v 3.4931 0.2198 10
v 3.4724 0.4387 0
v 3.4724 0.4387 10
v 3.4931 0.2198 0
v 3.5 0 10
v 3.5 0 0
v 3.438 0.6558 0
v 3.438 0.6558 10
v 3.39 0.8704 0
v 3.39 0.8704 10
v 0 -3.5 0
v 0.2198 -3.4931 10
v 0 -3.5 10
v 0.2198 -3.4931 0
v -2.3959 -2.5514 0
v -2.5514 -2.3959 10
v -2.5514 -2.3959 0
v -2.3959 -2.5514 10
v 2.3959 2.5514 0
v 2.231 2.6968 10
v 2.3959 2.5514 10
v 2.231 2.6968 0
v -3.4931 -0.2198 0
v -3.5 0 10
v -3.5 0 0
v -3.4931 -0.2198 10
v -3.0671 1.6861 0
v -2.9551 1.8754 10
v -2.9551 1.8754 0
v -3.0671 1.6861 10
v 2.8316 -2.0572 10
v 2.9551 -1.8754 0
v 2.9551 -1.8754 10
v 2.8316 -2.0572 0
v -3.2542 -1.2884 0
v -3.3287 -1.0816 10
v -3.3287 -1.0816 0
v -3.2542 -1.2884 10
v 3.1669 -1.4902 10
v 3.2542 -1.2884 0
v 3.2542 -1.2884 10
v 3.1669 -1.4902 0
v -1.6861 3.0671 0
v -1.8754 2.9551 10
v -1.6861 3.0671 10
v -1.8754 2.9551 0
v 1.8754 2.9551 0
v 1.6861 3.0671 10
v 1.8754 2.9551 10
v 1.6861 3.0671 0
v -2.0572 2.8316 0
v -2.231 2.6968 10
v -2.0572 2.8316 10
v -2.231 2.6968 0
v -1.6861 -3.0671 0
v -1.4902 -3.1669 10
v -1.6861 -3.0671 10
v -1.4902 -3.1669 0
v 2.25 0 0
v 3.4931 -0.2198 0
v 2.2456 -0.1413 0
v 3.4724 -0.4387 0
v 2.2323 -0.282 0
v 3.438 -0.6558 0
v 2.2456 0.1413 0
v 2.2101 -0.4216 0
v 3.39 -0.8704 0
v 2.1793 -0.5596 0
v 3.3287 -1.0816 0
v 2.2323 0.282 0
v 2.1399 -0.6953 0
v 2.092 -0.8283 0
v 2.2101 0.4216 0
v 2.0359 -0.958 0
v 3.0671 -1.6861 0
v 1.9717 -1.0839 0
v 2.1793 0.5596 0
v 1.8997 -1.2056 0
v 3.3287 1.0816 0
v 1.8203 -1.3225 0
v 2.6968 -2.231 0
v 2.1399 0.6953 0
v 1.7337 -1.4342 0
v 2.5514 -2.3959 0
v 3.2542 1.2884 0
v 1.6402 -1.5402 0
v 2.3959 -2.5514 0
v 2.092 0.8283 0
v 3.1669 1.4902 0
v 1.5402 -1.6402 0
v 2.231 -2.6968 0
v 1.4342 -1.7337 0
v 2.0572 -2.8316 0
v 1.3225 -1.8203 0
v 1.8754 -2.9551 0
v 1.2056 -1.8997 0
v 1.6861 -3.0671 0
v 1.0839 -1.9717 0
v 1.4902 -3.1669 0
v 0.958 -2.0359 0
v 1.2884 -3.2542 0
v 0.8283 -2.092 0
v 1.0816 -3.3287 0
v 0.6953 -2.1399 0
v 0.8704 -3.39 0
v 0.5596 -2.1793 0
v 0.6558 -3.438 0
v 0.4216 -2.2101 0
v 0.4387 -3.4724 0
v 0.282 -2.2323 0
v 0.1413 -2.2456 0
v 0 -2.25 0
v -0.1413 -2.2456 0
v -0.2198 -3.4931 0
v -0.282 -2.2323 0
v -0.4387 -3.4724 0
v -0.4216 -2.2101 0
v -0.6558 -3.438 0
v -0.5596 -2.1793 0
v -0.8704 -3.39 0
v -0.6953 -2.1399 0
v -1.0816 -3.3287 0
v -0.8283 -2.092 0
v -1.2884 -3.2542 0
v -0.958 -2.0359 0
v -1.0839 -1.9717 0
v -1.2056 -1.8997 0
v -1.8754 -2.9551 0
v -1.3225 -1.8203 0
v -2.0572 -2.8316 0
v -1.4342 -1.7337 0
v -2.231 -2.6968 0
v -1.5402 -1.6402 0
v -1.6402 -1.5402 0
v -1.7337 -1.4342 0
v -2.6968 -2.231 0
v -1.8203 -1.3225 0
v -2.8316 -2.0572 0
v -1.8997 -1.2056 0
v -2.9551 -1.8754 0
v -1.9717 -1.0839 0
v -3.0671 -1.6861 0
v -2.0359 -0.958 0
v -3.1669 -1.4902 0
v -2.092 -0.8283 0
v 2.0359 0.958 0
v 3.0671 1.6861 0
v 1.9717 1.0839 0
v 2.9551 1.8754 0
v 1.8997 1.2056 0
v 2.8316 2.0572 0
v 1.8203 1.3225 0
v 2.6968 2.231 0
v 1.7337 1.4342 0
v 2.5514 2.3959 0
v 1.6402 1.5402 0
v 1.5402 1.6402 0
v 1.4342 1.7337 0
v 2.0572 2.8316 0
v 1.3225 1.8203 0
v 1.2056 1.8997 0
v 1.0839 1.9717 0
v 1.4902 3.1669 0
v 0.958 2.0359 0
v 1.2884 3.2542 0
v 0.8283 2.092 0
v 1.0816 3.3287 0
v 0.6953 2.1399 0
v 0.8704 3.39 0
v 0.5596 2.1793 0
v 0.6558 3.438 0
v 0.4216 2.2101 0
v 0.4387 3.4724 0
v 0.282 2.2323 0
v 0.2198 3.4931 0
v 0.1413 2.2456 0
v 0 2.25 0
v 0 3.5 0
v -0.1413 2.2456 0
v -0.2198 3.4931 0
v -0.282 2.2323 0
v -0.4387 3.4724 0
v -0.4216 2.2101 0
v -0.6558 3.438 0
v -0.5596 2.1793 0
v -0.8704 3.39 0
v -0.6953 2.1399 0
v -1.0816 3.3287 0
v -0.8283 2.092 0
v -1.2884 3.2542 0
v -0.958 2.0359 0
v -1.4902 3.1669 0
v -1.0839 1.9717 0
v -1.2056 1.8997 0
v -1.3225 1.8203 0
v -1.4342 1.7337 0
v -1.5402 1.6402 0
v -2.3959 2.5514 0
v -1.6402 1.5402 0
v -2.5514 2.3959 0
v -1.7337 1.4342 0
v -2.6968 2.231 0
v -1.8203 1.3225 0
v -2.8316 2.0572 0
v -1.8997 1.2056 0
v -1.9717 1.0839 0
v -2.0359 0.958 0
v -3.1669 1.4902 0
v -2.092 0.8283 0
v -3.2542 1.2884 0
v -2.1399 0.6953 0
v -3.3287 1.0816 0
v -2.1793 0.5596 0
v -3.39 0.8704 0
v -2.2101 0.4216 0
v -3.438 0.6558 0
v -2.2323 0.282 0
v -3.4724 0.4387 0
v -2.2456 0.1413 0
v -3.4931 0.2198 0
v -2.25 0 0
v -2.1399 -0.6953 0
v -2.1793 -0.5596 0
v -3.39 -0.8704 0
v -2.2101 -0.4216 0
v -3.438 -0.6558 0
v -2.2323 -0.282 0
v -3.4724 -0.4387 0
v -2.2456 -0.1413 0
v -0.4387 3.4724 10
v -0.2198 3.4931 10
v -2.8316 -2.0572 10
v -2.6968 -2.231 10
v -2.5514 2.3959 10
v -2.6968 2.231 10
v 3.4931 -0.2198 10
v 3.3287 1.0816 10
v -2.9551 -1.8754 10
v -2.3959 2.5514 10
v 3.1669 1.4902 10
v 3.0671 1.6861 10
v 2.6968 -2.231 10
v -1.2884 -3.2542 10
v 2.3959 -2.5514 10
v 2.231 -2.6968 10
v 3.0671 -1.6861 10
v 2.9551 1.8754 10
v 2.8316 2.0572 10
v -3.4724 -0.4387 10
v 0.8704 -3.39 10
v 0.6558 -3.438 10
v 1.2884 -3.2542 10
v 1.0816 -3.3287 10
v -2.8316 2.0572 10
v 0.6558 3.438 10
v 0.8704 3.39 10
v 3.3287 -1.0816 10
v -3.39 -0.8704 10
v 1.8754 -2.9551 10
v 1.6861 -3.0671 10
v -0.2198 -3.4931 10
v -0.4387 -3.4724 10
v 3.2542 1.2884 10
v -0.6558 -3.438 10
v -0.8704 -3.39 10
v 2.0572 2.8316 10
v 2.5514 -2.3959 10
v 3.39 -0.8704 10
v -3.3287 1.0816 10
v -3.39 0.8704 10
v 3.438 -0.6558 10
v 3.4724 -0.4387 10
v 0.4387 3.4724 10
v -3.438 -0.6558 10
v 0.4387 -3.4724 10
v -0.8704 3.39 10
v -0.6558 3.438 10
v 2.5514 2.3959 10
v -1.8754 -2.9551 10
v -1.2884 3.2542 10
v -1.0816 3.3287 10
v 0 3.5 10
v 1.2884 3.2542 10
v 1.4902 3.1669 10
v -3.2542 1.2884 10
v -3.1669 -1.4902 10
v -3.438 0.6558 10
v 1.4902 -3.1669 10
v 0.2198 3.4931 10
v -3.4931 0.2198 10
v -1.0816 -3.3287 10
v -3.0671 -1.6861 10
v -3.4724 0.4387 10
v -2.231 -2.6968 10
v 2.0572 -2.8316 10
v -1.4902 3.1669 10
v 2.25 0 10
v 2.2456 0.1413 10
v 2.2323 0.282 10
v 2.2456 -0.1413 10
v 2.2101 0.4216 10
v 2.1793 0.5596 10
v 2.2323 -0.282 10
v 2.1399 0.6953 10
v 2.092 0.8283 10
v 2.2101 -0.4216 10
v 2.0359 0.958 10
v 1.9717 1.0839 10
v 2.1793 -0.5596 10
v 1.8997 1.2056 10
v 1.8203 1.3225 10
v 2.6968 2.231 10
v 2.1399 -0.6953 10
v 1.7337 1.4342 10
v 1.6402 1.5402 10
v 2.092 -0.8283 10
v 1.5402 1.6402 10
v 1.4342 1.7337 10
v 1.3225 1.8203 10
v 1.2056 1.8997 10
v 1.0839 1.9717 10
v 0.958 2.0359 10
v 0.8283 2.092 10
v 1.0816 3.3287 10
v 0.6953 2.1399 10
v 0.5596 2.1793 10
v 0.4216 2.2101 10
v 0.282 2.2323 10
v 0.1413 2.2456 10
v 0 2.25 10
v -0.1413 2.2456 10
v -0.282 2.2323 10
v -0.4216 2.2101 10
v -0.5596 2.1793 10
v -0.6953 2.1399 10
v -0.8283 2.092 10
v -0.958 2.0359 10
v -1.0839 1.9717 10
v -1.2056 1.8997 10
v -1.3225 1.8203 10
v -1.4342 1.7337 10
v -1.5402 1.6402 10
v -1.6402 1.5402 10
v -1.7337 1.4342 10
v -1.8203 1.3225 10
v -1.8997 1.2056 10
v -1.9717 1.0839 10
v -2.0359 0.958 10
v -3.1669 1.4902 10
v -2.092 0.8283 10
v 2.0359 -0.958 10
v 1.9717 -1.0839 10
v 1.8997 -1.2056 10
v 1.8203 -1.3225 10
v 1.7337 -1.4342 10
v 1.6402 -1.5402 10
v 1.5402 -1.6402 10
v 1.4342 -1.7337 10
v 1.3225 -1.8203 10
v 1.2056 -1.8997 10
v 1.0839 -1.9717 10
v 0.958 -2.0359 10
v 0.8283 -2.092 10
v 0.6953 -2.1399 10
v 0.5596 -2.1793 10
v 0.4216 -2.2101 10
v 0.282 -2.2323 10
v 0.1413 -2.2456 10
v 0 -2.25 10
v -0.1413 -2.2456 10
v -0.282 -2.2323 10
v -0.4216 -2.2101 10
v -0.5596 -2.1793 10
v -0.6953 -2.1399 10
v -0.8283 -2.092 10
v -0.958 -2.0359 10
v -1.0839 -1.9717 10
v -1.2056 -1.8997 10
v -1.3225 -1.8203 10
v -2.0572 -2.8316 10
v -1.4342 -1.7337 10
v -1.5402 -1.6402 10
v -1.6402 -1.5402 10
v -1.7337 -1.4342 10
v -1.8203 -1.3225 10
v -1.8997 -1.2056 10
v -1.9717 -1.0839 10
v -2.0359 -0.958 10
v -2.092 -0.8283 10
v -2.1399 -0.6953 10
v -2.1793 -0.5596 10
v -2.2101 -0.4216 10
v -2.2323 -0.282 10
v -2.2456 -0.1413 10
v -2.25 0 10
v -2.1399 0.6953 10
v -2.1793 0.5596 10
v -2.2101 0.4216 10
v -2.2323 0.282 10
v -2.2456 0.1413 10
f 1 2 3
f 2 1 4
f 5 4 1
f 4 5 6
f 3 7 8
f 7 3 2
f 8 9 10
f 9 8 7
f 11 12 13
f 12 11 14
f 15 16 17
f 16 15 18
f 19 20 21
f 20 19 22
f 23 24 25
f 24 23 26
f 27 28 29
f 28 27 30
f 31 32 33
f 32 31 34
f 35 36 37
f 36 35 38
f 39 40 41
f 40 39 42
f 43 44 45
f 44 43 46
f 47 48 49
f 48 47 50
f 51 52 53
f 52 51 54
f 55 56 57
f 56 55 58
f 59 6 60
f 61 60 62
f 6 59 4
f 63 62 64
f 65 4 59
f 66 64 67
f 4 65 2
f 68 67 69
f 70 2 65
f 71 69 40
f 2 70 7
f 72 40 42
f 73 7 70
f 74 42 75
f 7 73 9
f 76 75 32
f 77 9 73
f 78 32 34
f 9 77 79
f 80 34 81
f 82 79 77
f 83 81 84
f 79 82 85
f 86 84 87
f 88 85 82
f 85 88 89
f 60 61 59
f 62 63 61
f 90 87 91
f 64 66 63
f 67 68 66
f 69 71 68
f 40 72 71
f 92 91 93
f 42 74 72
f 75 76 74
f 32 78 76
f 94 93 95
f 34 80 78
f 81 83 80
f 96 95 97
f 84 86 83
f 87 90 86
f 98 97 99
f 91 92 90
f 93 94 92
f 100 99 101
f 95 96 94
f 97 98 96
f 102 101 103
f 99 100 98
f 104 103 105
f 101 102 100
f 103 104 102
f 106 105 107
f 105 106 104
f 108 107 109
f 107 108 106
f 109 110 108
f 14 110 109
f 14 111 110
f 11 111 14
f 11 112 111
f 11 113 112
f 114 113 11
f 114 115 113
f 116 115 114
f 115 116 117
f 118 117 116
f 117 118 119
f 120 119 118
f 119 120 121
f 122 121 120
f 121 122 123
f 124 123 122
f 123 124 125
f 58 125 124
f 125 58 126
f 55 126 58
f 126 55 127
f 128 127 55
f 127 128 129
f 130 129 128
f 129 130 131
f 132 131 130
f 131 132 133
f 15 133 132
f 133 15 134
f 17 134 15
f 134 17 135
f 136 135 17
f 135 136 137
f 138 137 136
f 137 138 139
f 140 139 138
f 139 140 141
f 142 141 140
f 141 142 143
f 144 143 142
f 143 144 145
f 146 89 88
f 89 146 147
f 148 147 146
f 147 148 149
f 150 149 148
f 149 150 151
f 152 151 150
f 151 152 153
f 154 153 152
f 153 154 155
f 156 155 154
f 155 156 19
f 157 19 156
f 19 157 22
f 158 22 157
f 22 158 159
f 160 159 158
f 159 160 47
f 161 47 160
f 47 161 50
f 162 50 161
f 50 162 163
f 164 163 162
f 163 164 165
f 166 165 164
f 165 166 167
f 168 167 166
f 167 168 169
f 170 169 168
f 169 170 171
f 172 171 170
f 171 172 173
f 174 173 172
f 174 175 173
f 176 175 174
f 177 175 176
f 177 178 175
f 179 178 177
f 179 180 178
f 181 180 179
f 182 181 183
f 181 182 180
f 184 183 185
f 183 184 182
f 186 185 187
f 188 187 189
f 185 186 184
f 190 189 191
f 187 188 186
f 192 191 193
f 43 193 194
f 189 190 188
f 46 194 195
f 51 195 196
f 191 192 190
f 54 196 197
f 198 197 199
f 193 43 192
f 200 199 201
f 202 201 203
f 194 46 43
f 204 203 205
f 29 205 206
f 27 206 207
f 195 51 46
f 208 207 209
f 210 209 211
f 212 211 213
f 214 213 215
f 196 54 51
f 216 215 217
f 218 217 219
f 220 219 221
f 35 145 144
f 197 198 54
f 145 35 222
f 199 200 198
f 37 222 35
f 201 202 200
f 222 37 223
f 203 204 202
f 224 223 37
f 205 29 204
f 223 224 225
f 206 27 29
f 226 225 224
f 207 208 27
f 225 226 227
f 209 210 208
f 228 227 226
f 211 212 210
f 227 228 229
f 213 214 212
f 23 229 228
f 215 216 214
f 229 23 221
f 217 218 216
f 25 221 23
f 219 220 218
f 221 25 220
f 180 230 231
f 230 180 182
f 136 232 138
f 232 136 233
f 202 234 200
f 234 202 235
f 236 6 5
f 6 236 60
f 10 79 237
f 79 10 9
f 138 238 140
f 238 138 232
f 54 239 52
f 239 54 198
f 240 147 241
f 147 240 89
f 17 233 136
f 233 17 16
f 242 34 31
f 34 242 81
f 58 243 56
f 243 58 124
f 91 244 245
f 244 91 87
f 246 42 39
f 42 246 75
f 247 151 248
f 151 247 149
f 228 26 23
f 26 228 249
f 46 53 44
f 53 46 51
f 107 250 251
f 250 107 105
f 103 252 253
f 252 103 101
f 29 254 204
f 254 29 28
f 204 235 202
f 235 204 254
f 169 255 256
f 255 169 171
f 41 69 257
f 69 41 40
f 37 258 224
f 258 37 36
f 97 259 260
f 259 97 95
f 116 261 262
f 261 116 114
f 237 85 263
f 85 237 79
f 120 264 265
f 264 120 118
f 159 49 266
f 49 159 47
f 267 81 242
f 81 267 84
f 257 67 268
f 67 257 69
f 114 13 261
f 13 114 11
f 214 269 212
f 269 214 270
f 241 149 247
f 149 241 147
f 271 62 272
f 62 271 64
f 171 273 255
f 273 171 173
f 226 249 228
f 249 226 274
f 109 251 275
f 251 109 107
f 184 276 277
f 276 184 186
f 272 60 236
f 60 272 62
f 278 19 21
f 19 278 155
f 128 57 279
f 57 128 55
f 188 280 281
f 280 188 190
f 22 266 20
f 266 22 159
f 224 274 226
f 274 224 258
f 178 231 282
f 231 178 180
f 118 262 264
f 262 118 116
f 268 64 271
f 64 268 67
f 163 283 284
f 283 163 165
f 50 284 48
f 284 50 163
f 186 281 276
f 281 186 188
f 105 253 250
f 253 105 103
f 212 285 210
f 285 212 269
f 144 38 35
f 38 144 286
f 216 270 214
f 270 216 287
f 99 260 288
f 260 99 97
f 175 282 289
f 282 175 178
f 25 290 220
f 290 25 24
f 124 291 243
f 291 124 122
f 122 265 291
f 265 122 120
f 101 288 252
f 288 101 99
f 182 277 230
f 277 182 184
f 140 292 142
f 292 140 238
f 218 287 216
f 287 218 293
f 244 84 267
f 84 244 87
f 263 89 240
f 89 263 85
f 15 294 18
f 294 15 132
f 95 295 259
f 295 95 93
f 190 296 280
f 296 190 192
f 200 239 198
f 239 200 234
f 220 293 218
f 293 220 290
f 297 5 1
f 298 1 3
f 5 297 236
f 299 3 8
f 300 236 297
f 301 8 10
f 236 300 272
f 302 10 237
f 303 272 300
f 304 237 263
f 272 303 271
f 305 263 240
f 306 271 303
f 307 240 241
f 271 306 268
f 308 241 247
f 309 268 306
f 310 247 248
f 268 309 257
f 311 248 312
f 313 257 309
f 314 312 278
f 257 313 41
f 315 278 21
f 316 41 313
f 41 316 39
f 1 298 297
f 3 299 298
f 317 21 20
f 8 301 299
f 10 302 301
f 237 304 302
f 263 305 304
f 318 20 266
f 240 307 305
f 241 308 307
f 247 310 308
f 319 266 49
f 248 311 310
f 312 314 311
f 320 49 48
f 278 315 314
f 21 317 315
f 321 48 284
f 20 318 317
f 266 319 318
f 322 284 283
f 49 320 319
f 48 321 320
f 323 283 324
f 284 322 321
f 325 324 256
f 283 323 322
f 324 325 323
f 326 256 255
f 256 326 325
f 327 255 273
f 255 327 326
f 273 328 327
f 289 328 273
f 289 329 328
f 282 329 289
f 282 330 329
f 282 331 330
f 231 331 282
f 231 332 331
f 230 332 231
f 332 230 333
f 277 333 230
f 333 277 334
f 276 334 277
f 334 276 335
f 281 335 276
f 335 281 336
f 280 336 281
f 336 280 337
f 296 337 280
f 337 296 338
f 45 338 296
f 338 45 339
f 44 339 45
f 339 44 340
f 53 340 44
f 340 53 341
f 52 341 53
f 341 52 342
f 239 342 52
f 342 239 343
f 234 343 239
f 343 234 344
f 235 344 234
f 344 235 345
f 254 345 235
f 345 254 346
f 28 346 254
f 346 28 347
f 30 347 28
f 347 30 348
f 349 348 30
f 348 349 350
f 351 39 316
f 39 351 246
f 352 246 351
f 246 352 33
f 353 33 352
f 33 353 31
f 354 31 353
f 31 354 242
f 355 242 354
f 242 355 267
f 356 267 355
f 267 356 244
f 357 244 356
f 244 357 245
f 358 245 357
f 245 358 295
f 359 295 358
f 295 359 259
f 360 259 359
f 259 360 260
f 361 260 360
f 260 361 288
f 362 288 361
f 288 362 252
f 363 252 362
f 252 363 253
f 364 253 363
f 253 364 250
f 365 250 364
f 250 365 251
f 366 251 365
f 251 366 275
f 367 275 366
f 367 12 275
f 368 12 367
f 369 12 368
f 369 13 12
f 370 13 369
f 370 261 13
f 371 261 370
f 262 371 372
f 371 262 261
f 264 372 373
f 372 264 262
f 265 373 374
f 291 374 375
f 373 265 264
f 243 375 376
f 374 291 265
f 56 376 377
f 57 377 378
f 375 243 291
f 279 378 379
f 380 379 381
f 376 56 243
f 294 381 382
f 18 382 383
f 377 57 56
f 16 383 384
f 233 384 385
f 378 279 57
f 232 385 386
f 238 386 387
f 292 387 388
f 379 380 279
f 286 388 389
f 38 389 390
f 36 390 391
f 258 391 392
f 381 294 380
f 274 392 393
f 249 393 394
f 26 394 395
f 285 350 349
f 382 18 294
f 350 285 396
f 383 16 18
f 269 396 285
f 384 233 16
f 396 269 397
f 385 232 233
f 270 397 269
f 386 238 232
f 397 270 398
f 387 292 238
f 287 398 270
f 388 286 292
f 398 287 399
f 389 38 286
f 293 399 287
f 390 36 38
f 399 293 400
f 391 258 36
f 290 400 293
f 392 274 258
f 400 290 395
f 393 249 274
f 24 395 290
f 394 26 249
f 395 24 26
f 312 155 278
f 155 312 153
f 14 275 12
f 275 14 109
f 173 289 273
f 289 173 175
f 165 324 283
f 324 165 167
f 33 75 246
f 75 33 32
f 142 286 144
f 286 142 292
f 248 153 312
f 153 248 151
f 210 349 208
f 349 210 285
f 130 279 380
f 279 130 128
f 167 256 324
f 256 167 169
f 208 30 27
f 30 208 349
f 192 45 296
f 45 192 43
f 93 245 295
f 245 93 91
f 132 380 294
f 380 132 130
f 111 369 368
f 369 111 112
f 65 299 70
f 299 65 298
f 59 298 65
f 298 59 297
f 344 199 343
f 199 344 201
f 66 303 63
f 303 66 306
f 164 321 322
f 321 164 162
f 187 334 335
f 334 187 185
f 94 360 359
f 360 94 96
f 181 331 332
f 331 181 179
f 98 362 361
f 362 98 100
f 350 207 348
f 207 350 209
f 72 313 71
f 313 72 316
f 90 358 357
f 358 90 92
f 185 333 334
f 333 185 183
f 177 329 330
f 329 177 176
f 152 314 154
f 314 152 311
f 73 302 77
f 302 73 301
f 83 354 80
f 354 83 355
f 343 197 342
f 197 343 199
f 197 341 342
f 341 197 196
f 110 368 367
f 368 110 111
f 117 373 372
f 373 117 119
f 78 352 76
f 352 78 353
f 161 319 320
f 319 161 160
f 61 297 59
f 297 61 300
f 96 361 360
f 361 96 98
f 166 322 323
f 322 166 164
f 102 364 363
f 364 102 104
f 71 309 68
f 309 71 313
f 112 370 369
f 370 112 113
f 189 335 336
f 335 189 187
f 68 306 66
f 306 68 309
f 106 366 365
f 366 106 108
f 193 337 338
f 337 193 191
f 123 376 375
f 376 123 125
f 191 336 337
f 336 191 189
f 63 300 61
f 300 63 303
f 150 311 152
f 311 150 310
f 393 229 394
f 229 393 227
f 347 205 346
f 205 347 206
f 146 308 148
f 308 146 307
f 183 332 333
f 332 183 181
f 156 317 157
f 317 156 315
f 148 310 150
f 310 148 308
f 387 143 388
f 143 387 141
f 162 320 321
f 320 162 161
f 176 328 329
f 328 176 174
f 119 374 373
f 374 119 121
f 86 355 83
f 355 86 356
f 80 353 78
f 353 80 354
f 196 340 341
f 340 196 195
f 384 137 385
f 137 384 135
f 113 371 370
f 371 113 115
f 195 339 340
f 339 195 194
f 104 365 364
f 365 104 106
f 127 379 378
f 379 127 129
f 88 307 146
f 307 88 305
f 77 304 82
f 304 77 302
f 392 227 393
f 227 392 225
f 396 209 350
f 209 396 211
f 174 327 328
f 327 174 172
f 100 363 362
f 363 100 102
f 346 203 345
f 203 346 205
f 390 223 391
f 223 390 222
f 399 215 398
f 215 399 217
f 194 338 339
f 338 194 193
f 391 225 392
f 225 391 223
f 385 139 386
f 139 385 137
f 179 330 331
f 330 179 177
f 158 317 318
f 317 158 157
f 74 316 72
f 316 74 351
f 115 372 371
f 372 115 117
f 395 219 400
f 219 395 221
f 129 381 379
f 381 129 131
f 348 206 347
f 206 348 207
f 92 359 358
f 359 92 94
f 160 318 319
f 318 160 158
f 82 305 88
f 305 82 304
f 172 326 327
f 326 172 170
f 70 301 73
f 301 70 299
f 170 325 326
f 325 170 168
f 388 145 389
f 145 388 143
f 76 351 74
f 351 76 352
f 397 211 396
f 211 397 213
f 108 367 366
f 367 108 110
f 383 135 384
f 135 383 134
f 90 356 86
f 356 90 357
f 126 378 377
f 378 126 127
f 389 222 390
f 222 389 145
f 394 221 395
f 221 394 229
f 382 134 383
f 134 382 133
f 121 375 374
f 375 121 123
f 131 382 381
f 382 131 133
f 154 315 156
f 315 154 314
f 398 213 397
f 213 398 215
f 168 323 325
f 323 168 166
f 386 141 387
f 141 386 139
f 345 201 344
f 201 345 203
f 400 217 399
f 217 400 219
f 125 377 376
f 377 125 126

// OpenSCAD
$fn = 100;

//entretoise_ep = 1;
entretoise_diam_int = 4.5;
//entretoise_diam_ext = entretoise_diam_int + 2*entretoise_ep;
entretoise_diam_ext = 7;
entretoise_long = 10;

difference() {
    cylinder(d=entretoise_diam_ext, h=entretoise_long);
    
    translate([0,0,-1])
        cylinder(d=entretoise_diam_int, h=entretoise_long + 2);
}
